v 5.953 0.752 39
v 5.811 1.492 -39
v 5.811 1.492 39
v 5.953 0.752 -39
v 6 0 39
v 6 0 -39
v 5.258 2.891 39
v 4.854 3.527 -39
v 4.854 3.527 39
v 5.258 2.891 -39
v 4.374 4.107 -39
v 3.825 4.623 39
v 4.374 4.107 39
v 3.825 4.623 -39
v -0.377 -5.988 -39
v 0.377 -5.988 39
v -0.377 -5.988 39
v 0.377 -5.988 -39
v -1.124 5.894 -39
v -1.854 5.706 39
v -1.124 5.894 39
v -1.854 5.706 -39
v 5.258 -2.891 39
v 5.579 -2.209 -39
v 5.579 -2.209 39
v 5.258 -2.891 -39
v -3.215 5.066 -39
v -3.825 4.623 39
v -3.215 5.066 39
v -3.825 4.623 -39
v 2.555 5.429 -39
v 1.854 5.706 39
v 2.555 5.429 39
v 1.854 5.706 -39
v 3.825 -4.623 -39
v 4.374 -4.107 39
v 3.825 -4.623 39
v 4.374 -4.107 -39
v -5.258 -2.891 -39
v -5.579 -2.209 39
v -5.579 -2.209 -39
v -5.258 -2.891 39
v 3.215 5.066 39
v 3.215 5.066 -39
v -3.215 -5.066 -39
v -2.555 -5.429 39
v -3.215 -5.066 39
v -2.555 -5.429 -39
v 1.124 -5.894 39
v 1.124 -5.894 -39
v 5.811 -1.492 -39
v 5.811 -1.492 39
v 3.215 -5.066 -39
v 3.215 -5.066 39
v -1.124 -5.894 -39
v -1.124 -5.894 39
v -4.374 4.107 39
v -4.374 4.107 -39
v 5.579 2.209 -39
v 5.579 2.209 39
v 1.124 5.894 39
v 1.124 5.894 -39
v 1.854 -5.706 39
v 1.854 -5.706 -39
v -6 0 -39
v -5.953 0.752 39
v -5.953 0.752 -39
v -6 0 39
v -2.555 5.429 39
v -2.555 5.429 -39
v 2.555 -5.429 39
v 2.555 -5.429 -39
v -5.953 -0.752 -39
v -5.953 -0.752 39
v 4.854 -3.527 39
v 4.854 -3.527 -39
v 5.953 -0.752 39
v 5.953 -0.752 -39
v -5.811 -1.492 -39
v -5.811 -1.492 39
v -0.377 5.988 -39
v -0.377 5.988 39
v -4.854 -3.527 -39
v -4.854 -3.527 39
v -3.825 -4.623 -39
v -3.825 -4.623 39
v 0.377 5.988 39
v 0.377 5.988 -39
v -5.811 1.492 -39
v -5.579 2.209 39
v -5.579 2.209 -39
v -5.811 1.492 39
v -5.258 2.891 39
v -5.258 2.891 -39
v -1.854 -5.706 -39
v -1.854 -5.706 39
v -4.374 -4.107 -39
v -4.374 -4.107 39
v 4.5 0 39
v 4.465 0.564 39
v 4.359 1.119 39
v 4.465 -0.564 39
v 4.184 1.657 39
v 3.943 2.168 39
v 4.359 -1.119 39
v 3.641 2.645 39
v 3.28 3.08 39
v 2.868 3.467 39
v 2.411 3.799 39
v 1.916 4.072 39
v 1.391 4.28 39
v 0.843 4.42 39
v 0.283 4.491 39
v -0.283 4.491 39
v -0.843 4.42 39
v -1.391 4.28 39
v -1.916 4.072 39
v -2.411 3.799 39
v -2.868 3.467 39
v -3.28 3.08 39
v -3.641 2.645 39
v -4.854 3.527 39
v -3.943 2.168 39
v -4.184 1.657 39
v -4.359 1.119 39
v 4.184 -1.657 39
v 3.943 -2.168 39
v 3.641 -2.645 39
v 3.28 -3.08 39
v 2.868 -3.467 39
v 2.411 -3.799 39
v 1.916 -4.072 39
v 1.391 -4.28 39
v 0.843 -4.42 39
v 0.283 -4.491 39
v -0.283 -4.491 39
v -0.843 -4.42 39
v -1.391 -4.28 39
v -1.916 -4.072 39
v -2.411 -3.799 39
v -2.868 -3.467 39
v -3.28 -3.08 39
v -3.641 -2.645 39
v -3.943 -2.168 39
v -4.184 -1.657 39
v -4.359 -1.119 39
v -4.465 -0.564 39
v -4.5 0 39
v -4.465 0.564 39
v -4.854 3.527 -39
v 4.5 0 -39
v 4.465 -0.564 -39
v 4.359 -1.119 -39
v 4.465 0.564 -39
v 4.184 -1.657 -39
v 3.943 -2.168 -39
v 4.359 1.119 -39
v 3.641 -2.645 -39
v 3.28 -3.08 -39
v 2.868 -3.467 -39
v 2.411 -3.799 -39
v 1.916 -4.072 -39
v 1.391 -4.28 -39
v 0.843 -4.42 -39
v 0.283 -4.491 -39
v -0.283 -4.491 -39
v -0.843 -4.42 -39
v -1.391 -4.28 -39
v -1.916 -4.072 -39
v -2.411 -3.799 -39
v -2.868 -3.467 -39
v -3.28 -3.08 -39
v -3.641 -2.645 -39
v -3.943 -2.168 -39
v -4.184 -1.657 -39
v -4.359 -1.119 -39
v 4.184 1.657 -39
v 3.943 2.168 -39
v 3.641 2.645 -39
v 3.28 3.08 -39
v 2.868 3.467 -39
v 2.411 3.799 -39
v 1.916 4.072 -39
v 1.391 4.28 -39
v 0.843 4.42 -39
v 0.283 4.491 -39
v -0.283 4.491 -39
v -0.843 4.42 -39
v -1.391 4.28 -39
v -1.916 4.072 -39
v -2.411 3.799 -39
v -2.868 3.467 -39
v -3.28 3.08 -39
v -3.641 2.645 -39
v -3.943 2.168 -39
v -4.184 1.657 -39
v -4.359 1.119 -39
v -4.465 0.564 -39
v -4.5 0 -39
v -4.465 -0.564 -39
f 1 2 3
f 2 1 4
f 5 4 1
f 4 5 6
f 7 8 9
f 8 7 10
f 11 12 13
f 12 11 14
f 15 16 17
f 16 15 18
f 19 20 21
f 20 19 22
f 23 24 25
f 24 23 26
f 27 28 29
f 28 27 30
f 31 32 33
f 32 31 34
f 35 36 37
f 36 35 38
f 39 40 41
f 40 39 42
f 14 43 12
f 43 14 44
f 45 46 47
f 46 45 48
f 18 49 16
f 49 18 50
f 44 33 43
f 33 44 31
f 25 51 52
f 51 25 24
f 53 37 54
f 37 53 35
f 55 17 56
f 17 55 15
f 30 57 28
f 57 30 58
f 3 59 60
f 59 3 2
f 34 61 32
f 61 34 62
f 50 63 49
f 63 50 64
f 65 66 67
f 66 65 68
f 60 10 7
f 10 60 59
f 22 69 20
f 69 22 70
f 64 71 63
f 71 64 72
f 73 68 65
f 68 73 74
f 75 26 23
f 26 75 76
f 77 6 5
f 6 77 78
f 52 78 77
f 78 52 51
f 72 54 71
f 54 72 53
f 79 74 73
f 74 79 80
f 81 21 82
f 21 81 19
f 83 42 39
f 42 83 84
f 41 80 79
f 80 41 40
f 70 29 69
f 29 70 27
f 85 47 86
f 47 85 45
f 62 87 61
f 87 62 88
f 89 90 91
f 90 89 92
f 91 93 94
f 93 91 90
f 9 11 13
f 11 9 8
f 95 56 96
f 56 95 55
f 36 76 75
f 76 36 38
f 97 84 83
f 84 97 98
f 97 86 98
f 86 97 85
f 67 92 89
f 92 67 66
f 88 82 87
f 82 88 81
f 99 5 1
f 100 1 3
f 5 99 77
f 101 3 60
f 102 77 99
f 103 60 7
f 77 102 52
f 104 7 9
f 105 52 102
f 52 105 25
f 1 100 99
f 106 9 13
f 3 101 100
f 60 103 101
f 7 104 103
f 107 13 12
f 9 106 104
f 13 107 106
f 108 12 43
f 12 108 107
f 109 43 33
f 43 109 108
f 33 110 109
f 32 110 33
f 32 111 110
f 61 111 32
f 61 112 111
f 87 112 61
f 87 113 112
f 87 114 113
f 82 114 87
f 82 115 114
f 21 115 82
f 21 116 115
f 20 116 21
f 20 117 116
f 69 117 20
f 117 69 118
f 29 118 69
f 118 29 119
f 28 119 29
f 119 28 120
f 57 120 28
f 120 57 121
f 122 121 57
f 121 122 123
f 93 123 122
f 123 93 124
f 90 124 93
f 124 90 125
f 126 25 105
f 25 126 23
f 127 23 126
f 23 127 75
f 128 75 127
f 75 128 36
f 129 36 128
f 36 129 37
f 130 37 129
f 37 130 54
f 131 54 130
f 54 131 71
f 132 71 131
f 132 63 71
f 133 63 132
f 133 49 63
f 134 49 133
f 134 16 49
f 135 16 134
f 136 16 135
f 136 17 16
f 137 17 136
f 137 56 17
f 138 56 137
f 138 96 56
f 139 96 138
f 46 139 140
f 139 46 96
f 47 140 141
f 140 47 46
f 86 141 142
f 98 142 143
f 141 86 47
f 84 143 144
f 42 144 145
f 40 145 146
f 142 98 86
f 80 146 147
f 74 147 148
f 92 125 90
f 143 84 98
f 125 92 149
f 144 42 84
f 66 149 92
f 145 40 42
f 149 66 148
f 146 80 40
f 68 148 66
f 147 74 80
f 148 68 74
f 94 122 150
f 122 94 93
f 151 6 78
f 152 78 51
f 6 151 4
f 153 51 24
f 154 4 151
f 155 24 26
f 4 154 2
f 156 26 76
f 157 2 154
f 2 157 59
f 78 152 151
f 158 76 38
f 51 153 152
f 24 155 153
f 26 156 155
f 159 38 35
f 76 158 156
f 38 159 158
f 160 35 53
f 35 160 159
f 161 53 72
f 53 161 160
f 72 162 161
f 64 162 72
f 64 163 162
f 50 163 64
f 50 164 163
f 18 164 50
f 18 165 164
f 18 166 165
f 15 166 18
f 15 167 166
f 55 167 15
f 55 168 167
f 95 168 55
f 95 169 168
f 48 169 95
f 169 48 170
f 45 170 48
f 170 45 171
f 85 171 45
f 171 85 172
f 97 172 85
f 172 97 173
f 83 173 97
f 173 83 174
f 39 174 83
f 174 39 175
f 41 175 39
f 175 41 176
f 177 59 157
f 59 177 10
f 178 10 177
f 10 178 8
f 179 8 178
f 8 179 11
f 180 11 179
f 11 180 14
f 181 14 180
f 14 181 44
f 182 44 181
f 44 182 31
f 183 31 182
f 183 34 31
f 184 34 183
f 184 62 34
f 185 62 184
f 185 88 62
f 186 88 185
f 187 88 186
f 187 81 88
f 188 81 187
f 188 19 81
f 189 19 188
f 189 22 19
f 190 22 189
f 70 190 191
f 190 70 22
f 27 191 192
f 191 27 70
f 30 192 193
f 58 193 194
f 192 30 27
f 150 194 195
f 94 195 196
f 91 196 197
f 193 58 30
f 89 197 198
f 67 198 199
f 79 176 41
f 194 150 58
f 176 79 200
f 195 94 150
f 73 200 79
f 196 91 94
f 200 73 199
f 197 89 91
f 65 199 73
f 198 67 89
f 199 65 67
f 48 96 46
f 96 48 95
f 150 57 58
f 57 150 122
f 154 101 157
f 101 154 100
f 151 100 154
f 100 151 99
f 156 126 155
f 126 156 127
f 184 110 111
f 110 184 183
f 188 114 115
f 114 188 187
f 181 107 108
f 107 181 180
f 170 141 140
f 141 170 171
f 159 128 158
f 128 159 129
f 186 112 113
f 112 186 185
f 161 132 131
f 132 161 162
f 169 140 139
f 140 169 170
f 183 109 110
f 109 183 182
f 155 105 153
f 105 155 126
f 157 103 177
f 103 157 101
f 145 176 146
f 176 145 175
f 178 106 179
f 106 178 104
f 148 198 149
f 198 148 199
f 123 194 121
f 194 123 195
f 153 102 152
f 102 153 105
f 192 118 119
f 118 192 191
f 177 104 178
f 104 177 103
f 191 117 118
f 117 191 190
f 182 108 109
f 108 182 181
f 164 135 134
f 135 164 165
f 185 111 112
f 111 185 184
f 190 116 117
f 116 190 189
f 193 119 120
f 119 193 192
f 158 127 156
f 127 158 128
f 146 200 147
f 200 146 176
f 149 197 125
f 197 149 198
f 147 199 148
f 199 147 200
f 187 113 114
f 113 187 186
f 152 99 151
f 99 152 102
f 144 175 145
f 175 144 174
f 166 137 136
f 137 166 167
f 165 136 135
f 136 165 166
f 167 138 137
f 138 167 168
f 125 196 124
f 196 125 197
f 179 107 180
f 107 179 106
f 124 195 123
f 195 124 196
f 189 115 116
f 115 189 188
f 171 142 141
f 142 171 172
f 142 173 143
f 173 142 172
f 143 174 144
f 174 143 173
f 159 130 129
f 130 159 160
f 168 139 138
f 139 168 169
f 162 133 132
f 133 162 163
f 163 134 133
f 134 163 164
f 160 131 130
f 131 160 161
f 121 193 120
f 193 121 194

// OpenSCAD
$fn = 50;


difference() {
	union() {
		translate(v = [0, 0, -39.0000000000]) {
			cylinder(h = 78, r = 6.0000000000);
		}
	}
	union() {
		translate(v = [0, 0, -100.0000000000]) {
			cylinder(h = 200, r = 4.5000000000);
		}
	}
}
